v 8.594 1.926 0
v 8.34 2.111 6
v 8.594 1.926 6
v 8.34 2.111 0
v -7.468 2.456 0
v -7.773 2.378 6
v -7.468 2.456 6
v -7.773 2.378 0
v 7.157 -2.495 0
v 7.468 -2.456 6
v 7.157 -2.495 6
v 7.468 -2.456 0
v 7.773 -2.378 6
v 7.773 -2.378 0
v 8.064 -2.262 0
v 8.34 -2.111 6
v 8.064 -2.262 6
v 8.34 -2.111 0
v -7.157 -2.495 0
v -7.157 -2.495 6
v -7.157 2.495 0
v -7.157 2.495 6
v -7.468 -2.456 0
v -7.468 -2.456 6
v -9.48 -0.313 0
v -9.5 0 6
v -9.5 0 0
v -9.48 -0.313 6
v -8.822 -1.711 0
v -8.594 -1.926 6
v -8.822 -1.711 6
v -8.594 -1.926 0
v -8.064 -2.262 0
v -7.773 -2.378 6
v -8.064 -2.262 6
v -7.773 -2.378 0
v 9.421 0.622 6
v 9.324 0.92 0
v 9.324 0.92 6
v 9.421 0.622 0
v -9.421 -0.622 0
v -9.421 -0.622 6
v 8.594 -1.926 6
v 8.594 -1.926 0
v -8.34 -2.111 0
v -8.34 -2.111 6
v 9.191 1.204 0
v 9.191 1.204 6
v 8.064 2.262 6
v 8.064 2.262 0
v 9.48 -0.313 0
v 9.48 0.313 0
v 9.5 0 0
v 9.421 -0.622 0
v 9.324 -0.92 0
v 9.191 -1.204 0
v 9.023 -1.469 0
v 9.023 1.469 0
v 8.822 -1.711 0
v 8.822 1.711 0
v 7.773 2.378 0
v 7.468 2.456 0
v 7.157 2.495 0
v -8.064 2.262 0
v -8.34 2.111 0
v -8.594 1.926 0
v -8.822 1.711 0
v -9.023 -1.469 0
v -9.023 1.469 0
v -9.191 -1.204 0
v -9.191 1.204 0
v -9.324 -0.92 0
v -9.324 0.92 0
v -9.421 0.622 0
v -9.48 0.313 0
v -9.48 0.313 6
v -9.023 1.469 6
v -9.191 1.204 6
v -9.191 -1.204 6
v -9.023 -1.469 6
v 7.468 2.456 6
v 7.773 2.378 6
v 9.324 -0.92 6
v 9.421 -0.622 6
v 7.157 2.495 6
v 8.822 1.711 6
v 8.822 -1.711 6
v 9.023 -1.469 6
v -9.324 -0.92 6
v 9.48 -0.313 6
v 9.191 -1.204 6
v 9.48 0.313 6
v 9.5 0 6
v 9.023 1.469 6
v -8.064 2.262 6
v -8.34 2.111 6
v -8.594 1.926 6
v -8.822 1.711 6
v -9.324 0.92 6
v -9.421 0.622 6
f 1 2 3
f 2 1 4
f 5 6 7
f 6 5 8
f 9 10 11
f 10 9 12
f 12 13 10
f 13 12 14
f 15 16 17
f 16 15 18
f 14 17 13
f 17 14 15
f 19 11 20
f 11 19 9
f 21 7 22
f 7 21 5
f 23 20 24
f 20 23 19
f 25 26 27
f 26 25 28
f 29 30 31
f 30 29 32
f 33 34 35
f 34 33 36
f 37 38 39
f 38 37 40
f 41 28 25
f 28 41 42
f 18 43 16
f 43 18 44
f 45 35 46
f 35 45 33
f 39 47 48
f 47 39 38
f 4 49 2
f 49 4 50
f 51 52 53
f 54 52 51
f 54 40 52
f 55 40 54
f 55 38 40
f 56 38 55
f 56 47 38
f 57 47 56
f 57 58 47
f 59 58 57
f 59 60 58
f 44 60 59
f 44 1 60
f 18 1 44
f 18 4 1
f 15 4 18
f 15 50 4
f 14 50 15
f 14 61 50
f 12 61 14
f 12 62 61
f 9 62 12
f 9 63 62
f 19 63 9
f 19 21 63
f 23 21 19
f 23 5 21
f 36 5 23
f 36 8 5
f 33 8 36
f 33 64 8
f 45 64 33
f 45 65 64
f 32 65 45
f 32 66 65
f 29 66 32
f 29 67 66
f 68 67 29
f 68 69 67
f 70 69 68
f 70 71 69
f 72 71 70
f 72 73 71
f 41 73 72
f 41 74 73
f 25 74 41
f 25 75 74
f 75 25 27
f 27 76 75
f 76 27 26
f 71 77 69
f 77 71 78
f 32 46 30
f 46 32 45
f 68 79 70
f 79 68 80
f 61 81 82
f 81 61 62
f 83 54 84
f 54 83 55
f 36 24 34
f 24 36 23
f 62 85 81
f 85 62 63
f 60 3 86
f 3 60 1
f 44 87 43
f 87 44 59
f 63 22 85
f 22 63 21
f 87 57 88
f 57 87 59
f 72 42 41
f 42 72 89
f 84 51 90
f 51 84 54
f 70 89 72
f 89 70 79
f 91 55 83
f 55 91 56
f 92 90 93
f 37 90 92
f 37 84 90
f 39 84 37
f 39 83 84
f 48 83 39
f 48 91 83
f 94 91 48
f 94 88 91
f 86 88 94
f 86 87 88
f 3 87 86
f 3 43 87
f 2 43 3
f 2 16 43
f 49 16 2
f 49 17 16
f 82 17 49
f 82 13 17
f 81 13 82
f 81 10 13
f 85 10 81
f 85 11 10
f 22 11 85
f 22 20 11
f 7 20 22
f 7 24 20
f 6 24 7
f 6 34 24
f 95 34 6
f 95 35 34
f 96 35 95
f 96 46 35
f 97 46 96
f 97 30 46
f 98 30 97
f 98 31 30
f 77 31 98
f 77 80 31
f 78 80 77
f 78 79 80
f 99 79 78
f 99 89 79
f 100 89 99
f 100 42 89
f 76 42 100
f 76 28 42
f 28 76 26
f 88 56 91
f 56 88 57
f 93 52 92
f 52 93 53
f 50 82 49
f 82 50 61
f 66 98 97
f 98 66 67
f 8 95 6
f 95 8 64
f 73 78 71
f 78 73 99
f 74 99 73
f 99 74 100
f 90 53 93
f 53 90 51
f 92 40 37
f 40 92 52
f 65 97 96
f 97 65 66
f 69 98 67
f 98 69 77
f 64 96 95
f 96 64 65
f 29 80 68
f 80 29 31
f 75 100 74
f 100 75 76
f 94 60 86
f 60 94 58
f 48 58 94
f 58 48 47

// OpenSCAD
$fn = 50;

difference() {
	union() {
		hull() {
			translate(v = [7.0, 0, 0]) {
				cylinder(h = 6, r = 2.5);
			}
			translate(v = [-7.0, 0, 0]) {
				cylinder(h = 6, r = 2.5);
			}
		}
	}
	union();
}
